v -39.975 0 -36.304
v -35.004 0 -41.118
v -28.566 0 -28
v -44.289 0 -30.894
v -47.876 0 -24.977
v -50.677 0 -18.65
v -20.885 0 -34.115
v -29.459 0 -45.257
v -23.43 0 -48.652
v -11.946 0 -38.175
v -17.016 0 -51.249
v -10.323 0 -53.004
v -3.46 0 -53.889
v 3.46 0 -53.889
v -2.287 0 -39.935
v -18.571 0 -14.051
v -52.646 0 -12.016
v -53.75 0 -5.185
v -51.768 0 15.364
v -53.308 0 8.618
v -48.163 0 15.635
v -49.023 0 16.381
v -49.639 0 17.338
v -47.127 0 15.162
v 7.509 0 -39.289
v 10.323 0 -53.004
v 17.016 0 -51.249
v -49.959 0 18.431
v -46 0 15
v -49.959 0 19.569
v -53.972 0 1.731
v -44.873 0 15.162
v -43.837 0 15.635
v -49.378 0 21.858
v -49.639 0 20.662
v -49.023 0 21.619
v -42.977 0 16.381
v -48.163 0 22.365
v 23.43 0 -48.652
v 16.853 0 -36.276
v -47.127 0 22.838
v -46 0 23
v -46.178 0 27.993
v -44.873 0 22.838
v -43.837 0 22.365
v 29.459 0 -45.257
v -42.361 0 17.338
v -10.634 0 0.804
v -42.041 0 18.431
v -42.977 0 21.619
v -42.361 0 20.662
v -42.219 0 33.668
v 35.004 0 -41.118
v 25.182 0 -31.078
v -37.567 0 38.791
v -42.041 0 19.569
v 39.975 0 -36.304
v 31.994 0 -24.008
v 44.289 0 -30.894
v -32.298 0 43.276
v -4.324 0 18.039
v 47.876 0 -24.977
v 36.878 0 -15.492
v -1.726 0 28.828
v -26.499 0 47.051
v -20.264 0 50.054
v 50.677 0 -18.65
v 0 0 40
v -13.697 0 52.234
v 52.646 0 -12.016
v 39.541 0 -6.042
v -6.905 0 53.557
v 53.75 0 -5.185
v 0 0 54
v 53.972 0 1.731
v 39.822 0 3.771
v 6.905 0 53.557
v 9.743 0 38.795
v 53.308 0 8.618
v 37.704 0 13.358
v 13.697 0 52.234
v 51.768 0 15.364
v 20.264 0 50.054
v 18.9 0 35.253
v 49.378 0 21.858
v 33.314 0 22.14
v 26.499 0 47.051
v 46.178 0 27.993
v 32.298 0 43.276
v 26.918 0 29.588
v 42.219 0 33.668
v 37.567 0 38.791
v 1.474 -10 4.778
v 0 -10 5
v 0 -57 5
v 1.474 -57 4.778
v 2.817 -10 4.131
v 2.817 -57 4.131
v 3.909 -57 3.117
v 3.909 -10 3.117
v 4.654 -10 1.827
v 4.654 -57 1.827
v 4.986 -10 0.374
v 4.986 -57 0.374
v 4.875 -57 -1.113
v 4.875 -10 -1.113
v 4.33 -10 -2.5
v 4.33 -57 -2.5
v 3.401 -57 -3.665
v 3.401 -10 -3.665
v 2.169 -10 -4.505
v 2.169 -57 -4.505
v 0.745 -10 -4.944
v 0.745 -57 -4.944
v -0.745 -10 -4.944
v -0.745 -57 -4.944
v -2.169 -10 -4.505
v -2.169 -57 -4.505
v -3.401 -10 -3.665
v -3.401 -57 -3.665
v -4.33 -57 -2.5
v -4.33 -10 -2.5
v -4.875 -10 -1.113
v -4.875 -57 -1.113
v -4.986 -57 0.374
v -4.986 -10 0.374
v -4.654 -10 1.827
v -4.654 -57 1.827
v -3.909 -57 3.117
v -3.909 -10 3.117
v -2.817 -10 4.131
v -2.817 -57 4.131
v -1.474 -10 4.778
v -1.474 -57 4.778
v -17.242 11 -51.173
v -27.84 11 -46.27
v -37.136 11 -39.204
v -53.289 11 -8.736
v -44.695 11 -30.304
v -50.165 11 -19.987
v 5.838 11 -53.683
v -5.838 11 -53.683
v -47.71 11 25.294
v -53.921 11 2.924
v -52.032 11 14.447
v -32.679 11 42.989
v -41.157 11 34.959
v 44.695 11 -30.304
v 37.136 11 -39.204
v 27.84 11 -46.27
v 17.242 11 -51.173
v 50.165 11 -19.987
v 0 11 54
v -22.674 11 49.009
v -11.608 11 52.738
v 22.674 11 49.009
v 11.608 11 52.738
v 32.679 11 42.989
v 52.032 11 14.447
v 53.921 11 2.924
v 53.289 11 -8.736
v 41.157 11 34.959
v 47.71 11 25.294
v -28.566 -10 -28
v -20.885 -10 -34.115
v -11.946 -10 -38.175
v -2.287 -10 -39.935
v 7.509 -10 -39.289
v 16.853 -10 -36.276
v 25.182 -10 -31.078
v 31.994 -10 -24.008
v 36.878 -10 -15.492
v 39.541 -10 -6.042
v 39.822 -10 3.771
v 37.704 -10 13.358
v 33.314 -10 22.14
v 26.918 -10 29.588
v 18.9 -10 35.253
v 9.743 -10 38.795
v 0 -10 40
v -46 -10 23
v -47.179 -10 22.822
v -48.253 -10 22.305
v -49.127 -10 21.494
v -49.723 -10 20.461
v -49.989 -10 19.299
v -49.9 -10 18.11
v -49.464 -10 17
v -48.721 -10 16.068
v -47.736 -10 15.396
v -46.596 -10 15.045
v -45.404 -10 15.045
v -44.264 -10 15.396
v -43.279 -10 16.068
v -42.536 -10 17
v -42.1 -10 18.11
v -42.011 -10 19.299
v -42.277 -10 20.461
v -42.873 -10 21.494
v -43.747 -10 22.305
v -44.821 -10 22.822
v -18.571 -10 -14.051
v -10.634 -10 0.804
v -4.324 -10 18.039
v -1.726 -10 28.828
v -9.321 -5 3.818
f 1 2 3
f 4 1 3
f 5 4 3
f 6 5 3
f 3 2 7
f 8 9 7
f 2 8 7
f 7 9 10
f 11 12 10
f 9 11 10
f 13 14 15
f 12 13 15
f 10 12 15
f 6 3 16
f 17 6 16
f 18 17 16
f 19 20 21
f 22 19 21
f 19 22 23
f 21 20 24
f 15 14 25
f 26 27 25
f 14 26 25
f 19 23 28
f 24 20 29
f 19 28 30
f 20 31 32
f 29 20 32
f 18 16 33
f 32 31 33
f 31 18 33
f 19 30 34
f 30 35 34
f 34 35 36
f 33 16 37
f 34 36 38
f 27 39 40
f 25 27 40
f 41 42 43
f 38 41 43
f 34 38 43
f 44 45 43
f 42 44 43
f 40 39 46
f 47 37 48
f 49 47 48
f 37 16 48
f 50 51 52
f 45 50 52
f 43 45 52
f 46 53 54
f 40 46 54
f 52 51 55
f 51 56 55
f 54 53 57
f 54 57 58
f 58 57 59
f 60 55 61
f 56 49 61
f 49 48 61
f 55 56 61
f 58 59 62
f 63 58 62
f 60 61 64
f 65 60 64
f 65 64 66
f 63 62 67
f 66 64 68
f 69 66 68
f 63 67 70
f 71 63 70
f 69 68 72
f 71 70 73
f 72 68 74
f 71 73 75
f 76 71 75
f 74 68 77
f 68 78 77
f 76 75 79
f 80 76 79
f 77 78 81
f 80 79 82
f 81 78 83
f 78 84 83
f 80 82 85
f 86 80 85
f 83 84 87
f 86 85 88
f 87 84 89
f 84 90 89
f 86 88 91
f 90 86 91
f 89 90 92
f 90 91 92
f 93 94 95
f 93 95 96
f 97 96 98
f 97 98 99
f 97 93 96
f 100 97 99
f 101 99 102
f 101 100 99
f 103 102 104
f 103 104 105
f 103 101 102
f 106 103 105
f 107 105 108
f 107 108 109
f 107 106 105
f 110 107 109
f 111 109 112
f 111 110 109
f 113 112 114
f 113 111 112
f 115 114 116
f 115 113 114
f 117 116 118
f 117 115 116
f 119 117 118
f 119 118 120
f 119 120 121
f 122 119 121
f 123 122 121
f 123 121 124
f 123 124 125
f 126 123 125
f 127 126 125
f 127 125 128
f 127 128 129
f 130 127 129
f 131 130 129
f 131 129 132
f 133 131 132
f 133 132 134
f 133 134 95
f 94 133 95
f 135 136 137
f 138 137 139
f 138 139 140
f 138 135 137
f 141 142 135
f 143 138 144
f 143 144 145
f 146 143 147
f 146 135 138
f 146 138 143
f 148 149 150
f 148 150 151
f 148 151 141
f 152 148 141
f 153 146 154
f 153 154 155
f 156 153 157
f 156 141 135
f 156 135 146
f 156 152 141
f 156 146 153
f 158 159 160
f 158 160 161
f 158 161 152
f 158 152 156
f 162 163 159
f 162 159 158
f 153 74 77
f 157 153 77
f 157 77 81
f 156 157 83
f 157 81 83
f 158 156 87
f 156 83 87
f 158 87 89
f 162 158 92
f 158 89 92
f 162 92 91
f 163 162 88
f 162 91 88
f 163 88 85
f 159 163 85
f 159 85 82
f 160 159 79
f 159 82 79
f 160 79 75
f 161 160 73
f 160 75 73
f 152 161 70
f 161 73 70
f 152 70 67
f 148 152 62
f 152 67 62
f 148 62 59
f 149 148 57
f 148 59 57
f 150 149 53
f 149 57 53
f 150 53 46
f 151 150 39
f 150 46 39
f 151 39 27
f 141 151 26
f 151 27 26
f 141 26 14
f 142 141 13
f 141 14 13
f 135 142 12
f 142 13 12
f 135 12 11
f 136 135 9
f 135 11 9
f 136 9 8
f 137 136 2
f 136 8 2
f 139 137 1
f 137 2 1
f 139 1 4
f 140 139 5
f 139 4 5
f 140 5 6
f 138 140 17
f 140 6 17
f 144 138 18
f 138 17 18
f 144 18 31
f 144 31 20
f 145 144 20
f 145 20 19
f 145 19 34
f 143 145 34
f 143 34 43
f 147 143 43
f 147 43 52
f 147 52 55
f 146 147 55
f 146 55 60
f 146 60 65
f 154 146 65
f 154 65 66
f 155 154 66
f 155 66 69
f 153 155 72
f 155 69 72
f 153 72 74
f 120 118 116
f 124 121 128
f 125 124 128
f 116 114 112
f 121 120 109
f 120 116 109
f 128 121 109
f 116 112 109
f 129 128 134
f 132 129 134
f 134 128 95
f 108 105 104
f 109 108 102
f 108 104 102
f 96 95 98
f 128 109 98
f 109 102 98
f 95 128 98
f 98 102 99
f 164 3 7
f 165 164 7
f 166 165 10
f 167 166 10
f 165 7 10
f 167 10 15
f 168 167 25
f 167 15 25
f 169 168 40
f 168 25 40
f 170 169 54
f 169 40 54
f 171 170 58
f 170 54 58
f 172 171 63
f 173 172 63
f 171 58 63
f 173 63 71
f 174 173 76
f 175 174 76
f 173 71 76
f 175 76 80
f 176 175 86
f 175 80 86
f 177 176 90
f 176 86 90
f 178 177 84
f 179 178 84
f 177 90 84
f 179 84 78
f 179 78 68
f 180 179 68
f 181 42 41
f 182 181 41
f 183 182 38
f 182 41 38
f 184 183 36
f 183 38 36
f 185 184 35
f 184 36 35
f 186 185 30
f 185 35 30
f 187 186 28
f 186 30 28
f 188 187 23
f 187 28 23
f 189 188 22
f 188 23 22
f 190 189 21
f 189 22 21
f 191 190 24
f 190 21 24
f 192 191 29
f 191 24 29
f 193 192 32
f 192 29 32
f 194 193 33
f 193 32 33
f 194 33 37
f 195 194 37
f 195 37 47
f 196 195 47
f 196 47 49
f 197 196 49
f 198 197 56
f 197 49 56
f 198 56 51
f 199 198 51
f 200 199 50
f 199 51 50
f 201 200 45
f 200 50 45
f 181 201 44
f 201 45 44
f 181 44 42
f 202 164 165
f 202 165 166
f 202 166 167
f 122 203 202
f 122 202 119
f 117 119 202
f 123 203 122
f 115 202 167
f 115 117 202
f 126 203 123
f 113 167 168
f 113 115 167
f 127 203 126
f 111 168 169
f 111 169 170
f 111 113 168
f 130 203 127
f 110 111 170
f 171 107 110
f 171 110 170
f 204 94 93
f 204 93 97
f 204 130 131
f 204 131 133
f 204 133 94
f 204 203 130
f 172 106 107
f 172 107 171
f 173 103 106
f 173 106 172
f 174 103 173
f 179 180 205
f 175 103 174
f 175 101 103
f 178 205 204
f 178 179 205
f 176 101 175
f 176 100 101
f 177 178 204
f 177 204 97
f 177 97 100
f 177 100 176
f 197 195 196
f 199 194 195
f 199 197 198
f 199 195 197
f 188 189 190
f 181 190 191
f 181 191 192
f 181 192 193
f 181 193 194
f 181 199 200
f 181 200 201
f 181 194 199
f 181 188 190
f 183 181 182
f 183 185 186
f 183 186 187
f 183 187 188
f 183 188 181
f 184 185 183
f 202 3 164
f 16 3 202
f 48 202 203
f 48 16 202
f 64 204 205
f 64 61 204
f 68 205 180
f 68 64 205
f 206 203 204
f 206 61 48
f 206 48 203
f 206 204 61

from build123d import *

# Parameters (mm, degrees)
SKETCH2_R           = 5
BOSS_EXTRUDE2_DEPTH = 57
SKETCH2_5_R         = 54
BOSS_EXTRUDE4_DEPTH = 11
SKETCH3_R           = 4
BOSS_EXTRUDE6_DEPTH = 10


with BuildPart() as part:
    # Sketch2 → Boss-Extrude2 (new body)
    with BuildSketch(Plane(origin=(0, 0, 0), x_dir=(1, 0, 0), z_dir=(0, 1, 0))):
        Circle(SKETCH2_R)
    extrude(amount=-BOSS_EXTRUDE2_DEPTH)

    # Sketch2<5> → Boss-Extrude4 (add)
    with BuildSketch(Plane(origin=(0, 0, 0), x_dir=(1, 0, 0), z_dir=(0, 1, 0))):
        Circle(SKETCH2_5_R)
    extrude(amount=BOSS_EXTRUDE4_DEPTH)

    # Sketch3 → Boss-Extrude6 (add)
    with BuildSketch(Plane.XZ):
        with Locations((-46, 19)):
            Circle(SKETCH3_R)
        with BuildLine():
            ThreePointArc((-28.565713714, -28), (36.878177829, -15.491933385), (0, 40))
            add(Edge.make_bspline(
                [(-28.565713714, -28), (-4.359091078, 1.635688794), (0, 40)],
                knots=[0, 0, 0, 1, 1, 1], degree=2))
        make_face()
    extrude(amount=BOSS_EXTRUDE6_DEPTH)


solid = part.part
